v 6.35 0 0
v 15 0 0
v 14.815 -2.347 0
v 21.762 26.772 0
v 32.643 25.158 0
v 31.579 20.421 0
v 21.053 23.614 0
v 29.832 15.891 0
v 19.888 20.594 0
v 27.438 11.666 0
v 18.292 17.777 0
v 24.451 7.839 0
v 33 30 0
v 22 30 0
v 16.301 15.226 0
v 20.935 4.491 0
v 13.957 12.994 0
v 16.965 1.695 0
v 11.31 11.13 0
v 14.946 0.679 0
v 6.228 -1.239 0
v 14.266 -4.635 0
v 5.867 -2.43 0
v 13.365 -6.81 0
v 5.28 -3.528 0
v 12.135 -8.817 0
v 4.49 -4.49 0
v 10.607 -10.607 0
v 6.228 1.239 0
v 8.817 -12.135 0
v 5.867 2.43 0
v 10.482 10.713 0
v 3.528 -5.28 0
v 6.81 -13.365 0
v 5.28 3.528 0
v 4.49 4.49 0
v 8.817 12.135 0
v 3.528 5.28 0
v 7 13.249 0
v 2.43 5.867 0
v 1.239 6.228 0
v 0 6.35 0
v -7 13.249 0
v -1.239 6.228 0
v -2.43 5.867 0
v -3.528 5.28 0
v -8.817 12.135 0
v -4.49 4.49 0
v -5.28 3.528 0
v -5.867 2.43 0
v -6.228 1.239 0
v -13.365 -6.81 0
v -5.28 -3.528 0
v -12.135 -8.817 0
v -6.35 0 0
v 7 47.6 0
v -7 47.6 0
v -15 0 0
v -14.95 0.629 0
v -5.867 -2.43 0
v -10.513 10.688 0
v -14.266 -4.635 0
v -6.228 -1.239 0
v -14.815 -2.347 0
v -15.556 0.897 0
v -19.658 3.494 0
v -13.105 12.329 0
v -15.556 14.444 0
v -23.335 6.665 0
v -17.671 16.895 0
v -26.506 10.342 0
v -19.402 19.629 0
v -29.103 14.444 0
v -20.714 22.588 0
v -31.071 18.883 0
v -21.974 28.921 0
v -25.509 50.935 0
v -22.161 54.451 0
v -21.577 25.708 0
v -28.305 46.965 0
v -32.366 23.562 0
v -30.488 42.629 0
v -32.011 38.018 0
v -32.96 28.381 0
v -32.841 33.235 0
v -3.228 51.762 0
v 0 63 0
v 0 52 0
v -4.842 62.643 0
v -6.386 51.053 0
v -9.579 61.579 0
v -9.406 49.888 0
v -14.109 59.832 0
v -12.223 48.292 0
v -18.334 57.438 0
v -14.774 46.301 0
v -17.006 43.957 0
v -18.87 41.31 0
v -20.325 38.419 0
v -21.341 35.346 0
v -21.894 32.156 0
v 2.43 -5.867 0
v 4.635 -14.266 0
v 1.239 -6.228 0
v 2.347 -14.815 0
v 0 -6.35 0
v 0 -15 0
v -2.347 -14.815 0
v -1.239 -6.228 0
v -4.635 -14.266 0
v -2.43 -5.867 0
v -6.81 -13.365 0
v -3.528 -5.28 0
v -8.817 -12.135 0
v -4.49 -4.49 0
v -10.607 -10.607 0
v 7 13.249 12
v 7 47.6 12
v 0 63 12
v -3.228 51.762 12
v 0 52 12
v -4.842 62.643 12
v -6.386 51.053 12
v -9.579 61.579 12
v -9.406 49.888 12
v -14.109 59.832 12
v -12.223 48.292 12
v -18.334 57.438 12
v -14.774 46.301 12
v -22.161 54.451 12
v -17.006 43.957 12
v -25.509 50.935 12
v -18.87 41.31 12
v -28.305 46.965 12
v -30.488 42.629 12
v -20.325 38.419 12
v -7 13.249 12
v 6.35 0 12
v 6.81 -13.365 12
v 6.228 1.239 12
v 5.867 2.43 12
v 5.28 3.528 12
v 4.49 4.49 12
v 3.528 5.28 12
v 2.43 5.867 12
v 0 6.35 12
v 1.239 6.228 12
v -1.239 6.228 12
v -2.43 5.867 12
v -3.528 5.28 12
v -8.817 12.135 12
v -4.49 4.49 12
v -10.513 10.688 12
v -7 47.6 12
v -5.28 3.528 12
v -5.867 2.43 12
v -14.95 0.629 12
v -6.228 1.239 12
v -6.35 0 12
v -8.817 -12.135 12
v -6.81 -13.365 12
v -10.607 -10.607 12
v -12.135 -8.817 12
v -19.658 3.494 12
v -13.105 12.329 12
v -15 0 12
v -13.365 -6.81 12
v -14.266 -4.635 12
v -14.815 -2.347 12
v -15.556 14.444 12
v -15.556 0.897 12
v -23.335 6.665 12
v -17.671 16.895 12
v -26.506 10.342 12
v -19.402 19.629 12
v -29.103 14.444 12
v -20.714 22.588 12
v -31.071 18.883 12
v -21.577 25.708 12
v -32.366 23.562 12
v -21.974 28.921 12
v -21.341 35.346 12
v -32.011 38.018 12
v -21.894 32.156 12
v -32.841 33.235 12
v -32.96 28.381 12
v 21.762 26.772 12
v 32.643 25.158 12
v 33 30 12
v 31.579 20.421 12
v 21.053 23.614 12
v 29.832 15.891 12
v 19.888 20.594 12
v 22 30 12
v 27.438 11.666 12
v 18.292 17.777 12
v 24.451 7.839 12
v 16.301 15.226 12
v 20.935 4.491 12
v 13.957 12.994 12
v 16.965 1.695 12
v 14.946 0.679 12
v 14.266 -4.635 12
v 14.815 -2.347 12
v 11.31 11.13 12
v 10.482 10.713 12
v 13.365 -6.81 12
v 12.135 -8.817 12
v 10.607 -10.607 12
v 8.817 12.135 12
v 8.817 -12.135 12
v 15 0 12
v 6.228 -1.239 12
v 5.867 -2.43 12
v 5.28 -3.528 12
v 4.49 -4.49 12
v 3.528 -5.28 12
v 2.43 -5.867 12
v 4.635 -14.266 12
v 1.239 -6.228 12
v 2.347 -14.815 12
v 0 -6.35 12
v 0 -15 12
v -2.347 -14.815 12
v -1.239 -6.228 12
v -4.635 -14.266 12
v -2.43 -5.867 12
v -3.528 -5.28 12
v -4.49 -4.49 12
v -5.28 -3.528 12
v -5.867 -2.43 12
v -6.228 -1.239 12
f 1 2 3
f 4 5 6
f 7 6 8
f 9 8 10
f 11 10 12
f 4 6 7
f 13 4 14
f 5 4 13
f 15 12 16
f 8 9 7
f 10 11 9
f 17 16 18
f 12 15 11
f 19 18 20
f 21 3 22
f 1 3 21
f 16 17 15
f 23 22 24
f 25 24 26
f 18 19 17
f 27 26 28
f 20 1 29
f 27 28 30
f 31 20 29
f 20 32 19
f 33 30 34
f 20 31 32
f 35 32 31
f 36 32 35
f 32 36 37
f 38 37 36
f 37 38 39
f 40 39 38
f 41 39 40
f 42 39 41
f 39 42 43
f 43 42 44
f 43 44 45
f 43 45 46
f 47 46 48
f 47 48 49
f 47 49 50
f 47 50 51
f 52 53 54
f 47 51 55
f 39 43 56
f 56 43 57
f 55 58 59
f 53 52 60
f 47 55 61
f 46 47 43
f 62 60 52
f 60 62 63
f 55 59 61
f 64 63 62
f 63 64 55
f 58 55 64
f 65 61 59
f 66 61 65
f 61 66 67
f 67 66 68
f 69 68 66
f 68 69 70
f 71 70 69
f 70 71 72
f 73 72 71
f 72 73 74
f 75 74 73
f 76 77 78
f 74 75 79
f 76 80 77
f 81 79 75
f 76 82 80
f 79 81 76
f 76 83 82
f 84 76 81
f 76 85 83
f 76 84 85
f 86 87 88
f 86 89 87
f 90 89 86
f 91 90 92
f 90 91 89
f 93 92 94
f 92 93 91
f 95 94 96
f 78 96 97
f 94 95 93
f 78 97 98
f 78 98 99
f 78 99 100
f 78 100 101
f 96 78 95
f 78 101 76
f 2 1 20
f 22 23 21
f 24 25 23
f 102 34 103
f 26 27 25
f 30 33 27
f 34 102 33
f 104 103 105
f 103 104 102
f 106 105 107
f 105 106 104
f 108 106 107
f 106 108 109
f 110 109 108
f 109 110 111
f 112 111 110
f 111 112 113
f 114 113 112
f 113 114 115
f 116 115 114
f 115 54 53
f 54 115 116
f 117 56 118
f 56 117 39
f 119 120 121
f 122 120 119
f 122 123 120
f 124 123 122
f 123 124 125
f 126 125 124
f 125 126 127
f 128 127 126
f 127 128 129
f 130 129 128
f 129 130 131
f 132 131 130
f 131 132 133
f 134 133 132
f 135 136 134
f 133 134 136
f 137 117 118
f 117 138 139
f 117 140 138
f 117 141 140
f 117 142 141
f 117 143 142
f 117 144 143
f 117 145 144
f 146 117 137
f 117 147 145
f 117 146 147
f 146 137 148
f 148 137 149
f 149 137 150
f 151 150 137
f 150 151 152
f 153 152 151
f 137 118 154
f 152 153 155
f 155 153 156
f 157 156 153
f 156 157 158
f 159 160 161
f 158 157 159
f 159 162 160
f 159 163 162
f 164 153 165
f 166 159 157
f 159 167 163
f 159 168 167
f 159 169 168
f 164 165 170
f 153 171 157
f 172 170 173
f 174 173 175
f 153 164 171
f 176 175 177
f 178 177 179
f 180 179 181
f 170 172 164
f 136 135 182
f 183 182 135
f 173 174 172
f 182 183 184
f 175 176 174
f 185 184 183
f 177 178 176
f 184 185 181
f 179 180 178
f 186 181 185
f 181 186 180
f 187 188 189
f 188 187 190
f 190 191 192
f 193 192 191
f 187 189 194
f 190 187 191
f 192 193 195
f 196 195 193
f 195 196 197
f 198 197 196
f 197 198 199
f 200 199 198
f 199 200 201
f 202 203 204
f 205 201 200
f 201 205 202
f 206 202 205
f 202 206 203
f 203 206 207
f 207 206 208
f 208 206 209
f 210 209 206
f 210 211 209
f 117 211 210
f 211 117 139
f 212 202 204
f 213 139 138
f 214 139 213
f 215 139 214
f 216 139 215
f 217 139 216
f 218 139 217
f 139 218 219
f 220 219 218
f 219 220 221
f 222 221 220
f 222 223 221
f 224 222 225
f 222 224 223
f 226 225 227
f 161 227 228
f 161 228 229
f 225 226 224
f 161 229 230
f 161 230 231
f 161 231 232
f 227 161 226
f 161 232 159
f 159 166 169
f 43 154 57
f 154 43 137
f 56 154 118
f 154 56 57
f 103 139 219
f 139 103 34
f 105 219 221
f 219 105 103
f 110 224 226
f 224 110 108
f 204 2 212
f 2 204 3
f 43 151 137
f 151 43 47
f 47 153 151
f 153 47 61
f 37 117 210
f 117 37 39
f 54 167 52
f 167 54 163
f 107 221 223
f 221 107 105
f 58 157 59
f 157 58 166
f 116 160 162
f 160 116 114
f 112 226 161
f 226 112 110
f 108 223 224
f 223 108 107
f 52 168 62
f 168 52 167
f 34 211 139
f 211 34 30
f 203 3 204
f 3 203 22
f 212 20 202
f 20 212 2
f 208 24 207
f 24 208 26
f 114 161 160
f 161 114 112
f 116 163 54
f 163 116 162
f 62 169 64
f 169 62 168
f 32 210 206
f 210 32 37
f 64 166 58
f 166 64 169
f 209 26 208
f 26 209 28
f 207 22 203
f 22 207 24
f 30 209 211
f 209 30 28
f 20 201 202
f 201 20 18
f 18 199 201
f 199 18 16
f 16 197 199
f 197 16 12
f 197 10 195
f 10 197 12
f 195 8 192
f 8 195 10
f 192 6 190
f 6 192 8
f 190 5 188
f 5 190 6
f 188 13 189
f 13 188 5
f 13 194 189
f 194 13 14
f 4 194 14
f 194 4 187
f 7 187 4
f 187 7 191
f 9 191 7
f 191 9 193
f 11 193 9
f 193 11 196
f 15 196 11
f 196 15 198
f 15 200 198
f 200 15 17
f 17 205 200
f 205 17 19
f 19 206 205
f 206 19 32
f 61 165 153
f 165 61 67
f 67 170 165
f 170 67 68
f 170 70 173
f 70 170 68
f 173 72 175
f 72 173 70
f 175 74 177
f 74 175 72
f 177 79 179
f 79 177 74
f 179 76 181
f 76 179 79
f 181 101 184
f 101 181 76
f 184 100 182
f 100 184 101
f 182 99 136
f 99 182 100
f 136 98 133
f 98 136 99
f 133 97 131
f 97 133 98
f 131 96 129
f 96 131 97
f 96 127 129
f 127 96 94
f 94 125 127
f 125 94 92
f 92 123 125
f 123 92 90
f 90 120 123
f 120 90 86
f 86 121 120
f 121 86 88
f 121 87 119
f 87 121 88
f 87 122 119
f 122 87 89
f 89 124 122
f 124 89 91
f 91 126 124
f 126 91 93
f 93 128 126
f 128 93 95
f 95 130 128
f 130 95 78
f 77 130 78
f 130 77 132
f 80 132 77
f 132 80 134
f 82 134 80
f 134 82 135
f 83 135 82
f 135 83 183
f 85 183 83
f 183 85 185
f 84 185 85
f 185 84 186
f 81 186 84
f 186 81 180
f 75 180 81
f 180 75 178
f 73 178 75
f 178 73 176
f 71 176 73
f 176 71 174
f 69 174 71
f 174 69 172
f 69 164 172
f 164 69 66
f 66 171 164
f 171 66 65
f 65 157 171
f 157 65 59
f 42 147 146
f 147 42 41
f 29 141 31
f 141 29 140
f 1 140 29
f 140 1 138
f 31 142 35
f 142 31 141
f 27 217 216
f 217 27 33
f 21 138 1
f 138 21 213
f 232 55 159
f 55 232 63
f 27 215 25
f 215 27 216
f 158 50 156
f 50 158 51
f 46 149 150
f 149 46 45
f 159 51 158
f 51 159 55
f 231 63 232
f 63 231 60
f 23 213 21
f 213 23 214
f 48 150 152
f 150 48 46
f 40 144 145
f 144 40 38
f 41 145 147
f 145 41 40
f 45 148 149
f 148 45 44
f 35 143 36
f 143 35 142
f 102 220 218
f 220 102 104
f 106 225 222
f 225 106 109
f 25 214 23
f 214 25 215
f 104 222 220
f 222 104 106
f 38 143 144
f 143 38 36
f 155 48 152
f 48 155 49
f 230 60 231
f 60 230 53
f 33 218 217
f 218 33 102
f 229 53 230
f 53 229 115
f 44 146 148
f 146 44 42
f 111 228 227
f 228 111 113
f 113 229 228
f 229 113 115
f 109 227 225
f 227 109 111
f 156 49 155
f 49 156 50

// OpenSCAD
$fn = 32;

// ----------------------------------------------------------------------
// Hook: 60 mm shank into a 22 mm curl, 12 mm thick
// ----------------------------------------------------------------------

// --- parameters (mm) ---
shank_len = 60;           // shank length from the boss centre
shank_w = 14;             // shank width
boss_d = 30;              // boss diameter
bore_d = 12.7;            // boss bore
curl_in = 22;             // curl inner radius
curl_out = 33;            // curl outer radius
curl_sweep = 270;         // curl sweep angle
hook_t = 12;              // hook thickness

shank_profile = [[-7, 47.6], [7, 47.6], [7, 13], [-7, 13]];
boss_profile = [[15, 0], [14.815, 2.347], [14.266, 4.635], [13.365, 6.81], [12.135, 8.817], [10.607, 10.607], [8.817, 12.135], [6.81, 13.365], [4.635, 14.266], [2.347, 14.815], [0, 15], [-2.347, 14.815], [-4.635, 14.266], [-6.81, 13.365], [-8.817, 12.135], [-10.607, 10.607], [-12.135, 8.817], [-13.365, 6.81], [-14.266, 4.635], [-14.815, 2.347], [-15, 0], [-14.815, -2.347], [-14.266, -4.635], [-13.365, -6.81], [-12.135, -8.817], [-10.607, -10.607], [-8.817, -12.135], [-6.81, -13.365], [-4.635, -14.266], [-2.347, -14.815], [0, -15], [2.347, -14.815], [4.635, -14.266], [6.81, -13.365], [8.817, -12.135], [10.607, -10.607], [12.135, -8.817], [13.365, -6.81], [14.266, -4.635], [14.815, -2.347]];
curl_profile = [[0, 63], [-4.842, 62.643], [-9.579, 61.579], [-14.109, 59.832], [-18.334, 57.438], [-22.161, 54.451], [-25.509, 50.935], [-28.305, 46.965], [-30.488, 42.629], [-32.011, 38.018], [-32.841, 33.235], [-32.96, 28.381], [-32.366, 23.562], [-31.071, 18.883], [-29.103, 14.444], [-26.506, 10.342], [-23.335, 6.665], [-19.658, 3.494], [-15.556, 0.897], [-11.117, -1.071], [-6.438, -2.366], [-1.619, -2.96], [3.235, -2.841], [8.018, -2.011], [12.629, -0.488], [16.965, 1.695], [20.935, 4.491], [24.451, 7.839], [27.438, 11.666], [29.832, 15.891], [31.579, 20.421], [32.643, 25.158], [33, 30], [22, 30], [21.762, 26.772], [21.053, 23.614], [19.888, 20.594], [18.292, 17.777], [16.301, 15.226], [13.957, 12.994], [11.31, 11.13], [8.419, 9.675], [5.346, 8.659], [2.156, 8.106], [-1.079, 8.026], [-4.292, 8.423], [-7.412, 9.286], [-10.371, 10.598], [-13.105, 12.329], [-15.556, 14.444], [-17.671, 16.895], [-19.402, 19.629], [-20.714, 22.588], [-21.577, 25.708], [-21.974, 28.921], [-21.894, 32.156], [-21.341, 35.346], [-20.325, 38.419], [-18.87, 41.31], [-17.006, 43.957], [-14.774, 46.301], [-12.223, 48.292], [-9.406, 49.888], [-6.386, 51.053], [-3.228, 51.762], [0, 52]];

difference() {
  union() {
    /* three overlapping outlines: shank, boss and the smooth curl */
    linear_extrude(height = hook_t) polygon(shank_profile);
    linear_extrude(height = hook_t) polygon(boss_profile);
    linear_extrude(height = hook_t) polygon(curl_profile);
  }
  translate([0, 0, -2.5]) cylinder(h = hook_t + 5, d = bore_d);
}
